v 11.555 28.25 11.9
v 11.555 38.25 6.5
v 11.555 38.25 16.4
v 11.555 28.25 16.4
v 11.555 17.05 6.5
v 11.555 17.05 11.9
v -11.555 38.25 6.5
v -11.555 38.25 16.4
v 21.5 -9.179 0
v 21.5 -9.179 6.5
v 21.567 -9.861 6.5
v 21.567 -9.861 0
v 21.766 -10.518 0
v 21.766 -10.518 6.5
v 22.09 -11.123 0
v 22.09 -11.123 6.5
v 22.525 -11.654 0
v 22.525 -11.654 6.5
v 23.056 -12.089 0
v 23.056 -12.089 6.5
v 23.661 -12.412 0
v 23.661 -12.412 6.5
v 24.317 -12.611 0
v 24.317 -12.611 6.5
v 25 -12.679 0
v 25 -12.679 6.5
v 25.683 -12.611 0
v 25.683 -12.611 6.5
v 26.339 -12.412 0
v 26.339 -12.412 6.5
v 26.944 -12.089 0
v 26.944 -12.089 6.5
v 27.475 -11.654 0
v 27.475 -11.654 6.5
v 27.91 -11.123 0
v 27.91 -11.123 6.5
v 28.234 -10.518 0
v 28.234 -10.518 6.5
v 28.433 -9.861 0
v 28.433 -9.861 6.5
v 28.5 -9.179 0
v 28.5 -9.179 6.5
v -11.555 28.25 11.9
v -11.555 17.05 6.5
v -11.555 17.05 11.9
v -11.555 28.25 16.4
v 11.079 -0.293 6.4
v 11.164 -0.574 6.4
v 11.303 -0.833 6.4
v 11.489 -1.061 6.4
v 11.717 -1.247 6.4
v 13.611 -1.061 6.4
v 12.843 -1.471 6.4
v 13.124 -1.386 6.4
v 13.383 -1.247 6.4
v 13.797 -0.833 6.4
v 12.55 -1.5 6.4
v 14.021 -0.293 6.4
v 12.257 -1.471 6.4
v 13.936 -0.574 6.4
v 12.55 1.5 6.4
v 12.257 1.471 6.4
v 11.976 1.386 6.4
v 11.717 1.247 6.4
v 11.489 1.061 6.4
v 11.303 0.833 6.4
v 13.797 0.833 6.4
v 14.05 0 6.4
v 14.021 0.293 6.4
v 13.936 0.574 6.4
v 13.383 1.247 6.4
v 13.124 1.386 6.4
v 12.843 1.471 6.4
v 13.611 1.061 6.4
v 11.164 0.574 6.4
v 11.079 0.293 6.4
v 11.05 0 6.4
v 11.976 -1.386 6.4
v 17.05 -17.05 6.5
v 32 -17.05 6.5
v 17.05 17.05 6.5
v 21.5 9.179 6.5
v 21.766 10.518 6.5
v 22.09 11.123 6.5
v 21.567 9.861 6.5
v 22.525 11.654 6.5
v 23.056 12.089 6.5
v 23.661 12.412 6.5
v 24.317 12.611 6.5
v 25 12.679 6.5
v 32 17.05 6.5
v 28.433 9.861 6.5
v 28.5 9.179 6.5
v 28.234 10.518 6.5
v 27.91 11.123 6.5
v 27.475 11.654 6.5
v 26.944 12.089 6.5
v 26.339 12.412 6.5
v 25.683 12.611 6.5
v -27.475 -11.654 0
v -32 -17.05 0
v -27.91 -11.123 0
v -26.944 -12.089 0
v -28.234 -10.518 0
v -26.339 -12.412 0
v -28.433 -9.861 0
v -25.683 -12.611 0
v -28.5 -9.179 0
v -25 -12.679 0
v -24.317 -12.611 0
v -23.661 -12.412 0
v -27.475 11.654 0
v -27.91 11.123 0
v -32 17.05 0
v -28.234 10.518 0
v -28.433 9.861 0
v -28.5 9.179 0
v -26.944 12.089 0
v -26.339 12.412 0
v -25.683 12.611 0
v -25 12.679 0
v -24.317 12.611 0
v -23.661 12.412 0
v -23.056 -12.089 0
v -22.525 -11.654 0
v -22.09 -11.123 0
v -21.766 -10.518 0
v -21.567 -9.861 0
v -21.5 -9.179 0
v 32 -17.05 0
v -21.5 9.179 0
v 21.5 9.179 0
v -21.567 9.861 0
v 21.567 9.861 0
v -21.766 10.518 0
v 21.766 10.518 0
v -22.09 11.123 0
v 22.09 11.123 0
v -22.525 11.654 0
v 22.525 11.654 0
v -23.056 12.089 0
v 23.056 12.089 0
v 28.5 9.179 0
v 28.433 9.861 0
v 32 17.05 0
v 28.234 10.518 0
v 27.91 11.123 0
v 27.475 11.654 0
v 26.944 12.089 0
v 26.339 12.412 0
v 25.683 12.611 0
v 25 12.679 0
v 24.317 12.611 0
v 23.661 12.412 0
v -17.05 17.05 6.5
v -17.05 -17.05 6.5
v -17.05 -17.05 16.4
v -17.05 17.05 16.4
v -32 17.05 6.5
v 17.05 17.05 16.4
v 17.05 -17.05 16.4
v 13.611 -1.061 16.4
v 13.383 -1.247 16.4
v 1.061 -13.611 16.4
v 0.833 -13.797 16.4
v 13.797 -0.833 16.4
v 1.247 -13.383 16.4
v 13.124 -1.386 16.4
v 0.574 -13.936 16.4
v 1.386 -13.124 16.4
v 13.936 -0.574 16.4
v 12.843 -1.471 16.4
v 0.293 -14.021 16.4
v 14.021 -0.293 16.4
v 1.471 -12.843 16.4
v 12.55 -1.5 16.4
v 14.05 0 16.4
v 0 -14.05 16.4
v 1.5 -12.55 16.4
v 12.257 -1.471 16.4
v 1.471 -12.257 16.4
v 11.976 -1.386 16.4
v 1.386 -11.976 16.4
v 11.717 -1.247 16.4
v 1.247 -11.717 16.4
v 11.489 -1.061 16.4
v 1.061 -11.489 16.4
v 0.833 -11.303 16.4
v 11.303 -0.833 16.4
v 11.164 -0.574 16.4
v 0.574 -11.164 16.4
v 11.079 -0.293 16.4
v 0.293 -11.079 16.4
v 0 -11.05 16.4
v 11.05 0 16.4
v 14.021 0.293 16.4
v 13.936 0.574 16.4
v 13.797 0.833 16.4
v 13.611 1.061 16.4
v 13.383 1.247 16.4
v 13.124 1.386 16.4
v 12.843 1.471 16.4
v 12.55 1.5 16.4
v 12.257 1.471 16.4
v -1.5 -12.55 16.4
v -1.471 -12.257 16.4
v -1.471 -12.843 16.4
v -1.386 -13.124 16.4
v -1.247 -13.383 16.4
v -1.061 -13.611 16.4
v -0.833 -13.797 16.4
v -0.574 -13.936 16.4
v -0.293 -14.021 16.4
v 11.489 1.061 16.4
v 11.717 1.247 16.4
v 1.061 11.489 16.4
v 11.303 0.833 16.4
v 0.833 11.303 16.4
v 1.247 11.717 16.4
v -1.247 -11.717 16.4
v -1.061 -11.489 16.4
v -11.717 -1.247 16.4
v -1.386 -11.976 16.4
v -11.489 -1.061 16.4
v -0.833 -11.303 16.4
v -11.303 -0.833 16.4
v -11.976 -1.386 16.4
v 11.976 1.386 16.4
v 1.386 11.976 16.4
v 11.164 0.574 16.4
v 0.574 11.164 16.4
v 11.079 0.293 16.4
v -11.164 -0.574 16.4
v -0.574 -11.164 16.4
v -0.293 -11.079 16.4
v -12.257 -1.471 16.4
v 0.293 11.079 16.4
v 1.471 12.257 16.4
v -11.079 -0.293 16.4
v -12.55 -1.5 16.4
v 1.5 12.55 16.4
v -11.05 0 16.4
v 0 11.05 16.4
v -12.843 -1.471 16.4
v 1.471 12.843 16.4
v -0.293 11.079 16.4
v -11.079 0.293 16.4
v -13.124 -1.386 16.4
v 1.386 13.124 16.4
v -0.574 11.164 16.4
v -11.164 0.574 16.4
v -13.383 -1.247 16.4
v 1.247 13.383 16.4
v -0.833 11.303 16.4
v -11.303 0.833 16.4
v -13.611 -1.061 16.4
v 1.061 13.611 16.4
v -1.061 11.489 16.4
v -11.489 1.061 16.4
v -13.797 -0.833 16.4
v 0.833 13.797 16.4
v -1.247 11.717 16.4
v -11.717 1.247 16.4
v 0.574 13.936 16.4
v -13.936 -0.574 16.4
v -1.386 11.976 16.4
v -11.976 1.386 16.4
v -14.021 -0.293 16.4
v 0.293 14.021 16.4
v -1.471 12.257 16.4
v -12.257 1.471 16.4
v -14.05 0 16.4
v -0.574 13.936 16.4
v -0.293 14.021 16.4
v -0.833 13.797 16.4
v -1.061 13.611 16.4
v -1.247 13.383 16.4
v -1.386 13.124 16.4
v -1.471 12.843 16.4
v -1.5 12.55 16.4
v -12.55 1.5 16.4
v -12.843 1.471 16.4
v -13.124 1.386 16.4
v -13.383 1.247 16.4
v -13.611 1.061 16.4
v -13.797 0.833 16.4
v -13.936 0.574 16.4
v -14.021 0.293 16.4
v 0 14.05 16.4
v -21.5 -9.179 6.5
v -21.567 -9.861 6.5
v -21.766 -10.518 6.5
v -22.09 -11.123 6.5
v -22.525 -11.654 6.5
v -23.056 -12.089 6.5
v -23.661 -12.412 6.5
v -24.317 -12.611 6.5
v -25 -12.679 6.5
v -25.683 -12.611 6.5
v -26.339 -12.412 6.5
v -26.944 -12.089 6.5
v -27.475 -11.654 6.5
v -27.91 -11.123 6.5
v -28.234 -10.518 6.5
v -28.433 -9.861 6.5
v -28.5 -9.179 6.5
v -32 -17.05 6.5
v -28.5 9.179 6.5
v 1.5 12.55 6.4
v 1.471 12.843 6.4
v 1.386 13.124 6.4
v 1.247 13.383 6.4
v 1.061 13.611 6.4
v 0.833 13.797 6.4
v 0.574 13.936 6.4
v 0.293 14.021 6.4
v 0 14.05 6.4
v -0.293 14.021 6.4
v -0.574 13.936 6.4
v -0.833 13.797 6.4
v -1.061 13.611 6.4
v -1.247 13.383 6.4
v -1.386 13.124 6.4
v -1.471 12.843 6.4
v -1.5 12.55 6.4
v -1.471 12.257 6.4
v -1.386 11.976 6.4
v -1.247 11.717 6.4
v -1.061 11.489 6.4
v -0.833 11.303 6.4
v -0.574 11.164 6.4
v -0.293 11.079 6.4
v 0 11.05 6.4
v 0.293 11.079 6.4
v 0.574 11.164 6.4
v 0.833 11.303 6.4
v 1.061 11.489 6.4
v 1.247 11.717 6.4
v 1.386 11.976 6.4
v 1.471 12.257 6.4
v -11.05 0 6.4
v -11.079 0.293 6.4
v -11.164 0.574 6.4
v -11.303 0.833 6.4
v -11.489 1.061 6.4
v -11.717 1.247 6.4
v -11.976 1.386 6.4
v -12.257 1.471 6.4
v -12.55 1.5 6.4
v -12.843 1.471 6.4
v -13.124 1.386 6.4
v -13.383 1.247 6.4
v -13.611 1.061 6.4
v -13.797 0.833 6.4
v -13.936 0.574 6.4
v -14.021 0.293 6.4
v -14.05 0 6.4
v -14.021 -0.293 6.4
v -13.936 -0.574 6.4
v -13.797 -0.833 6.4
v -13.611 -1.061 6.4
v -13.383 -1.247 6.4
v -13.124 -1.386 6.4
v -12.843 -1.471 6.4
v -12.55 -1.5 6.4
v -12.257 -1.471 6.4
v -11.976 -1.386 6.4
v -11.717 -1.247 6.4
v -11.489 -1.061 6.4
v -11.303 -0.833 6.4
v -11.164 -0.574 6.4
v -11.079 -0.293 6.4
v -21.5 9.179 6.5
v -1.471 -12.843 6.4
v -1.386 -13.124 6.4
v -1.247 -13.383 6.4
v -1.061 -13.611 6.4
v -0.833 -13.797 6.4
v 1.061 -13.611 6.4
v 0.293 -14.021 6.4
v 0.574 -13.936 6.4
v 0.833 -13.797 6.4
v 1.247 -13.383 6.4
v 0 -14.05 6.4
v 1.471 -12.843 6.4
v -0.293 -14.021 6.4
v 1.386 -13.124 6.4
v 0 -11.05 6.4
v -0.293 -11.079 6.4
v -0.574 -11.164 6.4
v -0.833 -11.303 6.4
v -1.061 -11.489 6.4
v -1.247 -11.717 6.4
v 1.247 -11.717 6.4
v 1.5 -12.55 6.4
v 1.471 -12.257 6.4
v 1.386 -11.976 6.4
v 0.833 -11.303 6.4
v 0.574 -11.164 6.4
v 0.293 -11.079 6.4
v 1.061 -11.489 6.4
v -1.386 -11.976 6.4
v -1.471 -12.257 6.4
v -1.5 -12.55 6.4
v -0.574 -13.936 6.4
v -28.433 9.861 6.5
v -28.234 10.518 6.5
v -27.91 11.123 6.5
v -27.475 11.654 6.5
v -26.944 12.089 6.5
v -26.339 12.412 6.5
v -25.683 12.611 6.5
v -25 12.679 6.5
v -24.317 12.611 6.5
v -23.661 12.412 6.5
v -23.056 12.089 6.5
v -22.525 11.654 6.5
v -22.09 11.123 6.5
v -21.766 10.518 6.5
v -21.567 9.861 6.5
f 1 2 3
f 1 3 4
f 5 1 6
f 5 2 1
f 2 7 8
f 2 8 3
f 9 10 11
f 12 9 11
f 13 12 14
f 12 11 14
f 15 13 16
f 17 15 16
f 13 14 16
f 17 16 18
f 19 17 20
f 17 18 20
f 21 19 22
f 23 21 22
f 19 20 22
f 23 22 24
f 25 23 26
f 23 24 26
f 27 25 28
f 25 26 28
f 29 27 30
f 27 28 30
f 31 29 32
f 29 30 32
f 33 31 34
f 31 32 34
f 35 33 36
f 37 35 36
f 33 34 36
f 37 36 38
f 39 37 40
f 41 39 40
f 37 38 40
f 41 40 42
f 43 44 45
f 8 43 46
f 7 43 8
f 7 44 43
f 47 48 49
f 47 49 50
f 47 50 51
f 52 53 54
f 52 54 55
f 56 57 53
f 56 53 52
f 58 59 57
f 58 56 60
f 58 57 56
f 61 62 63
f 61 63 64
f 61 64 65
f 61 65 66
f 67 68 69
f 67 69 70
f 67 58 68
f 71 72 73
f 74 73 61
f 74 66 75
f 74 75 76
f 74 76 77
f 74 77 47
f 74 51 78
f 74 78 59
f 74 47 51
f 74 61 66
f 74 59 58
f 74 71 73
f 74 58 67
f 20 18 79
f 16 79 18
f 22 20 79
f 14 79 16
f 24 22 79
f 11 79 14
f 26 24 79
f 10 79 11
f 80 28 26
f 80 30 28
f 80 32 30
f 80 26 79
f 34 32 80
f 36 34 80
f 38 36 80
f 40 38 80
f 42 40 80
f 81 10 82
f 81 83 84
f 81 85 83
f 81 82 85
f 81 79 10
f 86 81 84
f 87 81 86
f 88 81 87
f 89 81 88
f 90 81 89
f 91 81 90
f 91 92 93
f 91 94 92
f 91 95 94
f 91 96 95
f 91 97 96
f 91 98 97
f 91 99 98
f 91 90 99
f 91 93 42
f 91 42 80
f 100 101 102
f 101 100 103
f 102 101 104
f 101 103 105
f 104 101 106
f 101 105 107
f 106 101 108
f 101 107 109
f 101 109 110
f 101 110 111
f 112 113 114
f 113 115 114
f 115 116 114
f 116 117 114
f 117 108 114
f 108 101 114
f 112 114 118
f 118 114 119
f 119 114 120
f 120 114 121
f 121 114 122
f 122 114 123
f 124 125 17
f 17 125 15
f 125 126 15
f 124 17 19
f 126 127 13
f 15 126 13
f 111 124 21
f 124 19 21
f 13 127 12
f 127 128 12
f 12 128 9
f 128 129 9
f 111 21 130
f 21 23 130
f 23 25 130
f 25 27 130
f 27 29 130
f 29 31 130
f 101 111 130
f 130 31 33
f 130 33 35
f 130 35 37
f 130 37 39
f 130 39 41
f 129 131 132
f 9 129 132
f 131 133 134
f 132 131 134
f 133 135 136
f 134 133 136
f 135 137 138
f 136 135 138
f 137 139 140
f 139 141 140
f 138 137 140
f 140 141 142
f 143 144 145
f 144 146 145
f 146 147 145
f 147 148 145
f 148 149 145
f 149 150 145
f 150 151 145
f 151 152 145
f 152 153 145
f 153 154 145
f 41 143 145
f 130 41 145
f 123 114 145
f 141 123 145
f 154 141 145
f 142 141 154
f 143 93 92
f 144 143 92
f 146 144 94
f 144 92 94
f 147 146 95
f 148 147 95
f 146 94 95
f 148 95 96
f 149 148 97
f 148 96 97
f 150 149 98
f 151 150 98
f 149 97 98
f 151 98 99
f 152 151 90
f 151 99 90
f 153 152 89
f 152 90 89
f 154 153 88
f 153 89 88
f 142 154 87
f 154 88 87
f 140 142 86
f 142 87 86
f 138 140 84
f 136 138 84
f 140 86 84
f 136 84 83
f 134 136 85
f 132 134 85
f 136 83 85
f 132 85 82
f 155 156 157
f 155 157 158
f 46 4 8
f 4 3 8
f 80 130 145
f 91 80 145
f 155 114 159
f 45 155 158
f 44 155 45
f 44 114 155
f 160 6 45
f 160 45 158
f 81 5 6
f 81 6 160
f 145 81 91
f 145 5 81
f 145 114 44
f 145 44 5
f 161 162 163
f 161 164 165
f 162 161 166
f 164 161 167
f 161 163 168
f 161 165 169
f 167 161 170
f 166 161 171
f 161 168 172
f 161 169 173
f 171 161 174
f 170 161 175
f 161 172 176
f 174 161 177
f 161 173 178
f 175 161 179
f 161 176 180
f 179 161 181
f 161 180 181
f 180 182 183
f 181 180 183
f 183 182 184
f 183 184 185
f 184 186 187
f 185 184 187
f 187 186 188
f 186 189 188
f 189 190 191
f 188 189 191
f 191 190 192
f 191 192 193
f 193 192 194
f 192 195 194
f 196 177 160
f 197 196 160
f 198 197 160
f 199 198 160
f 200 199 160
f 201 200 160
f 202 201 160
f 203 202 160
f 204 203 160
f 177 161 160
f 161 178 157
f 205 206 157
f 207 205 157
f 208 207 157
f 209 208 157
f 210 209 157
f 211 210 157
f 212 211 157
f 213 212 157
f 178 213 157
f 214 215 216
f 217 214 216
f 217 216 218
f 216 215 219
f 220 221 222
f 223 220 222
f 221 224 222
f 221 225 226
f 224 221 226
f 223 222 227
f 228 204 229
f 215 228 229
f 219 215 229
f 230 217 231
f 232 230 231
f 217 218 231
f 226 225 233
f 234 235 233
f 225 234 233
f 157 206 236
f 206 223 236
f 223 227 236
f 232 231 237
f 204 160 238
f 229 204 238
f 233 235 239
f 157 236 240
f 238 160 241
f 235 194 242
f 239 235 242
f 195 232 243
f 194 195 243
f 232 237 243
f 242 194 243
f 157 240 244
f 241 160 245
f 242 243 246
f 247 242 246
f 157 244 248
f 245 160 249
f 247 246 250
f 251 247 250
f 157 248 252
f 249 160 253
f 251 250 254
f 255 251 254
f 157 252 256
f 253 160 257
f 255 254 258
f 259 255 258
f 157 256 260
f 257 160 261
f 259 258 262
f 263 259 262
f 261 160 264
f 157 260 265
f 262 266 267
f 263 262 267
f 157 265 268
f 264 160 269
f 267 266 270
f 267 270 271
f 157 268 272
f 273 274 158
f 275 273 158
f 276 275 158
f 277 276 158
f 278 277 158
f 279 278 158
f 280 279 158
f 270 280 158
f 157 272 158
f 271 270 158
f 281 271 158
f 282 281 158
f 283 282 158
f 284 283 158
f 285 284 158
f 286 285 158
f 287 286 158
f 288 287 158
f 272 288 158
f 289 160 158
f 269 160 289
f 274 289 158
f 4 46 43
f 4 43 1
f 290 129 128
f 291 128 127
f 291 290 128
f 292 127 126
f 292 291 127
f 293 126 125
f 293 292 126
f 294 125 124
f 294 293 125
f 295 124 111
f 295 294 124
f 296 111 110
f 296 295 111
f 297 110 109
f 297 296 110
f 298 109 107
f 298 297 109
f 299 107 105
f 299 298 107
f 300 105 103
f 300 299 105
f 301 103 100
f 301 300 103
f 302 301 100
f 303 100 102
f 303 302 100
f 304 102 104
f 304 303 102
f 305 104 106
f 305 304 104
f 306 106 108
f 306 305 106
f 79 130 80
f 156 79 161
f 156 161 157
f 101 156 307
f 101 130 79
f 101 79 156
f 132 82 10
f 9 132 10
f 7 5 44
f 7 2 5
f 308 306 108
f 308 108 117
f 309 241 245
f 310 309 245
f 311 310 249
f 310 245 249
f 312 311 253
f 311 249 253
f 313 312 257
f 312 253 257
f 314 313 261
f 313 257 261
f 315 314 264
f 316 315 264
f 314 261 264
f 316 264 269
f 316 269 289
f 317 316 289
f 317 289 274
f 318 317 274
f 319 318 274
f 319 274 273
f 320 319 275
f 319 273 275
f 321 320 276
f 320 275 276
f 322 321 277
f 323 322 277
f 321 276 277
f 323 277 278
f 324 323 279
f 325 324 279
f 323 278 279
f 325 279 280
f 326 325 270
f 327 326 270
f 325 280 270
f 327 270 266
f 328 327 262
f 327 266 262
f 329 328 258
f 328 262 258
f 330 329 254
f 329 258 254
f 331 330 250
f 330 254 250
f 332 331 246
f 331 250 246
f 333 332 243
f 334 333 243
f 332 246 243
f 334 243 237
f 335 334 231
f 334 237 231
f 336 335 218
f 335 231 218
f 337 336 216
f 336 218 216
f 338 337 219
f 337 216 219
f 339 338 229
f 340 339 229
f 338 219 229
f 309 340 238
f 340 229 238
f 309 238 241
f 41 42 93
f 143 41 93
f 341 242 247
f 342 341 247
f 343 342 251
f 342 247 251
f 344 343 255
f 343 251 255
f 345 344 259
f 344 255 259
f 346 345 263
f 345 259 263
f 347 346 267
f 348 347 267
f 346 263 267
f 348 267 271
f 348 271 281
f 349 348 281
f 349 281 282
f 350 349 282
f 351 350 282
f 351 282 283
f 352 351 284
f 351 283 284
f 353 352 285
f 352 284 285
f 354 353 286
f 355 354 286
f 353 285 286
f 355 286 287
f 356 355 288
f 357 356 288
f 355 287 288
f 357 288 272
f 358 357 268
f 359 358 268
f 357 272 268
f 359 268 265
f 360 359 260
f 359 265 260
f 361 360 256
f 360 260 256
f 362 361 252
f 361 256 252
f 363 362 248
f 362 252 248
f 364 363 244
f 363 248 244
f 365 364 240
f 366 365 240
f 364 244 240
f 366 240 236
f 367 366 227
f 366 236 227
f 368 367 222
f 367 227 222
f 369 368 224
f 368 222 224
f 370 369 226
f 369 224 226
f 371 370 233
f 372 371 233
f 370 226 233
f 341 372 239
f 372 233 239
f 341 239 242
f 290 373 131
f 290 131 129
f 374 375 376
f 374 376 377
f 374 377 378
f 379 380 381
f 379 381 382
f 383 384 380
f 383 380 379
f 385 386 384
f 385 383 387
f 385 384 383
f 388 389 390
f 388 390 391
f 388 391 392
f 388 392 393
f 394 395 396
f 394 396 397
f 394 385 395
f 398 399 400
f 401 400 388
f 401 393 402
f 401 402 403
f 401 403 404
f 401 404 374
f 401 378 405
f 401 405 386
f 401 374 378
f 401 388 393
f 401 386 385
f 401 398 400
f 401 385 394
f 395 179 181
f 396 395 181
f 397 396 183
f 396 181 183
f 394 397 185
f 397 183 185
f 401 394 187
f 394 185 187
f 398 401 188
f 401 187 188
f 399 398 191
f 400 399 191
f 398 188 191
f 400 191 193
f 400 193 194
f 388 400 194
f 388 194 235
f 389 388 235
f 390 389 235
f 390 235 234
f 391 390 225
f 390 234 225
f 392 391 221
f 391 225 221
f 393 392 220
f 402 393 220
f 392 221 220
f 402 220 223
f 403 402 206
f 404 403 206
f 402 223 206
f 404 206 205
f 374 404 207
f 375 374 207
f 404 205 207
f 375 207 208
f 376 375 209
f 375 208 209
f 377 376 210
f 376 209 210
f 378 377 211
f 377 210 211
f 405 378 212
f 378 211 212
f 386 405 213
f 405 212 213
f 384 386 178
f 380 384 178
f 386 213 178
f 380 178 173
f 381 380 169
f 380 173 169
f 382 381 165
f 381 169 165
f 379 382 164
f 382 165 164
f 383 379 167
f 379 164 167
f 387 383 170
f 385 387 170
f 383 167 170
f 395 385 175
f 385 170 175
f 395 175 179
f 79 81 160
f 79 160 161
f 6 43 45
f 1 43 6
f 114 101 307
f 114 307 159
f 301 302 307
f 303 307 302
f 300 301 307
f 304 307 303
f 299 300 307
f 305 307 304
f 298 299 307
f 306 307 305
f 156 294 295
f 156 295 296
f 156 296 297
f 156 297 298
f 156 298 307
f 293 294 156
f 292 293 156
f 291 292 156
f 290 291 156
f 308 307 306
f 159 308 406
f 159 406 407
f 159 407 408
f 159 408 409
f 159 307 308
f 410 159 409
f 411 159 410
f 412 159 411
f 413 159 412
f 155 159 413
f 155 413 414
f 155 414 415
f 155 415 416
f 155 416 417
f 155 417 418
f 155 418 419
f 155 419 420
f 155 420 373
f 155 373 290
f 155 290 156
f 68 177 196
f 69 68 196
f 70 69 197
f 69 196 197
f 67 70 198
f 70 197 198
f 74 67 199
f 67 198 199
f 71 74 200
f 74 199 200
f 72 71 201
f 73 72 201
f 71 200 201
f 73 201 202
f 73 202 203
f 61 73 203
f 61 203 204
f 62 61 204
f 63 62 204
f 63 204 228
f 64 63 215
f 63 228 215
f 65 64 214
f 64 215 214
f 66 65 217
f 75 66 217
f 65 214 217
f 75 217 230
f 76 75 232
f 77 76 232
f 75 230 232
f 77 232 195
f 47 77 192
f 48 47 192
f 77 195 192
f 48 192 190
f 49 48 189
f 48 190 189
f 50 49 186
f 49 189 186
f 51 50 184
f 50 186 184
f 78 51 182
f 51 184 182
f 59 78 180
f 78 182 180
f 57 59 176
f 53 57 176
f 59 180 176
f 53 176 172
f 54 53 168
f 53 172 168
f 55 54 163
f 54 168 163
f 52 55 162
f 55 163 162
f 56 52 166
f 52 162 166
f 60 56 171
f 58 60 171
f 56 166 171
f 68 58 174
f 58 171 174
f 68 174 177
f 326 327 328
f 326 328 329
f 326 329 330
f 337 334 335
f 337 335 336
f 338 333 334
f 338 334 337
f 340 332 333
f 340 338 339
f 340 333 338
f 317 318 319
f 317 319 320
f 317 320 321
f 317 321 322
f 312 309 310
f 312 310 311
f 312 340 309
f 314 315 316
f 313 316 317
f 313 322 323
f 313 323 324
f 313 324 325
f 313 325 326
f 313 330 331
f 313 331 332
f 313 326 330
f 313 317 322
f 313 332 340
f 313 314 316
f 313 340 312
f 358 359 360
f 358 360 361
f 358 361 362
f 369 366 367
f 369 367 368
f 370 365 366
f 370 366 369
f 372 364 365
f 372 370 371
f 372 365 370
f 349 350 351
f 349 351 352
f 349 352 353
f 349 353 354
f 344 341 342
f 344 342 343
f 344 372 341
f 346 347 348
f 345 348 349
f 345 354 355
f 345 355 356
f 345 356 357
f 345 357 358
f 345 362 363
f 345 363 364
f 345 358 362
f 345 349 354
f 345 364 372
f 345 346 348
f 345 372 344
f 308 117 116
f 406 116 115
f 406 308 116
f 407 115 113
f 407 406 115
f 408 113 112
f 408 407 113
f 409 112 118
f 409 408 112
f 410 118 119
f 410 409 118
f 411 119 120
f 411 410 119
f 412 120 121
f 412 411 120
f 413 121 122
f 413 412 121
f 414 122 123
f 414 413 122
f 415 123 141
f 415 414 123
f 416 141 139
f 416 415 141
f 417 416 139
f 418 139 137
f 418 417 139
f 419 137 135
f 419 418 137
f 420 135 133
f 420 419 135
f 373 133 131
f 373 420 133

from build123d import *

# Parameters (mm, degrees)
SKETCH1_W           = 64
SKETCH1_H           = 34.1
BOSS_EXTRUDE1_DEPTH = 6.5
BOSS_EXTRUDE2_DEPTH = 9.9
SKETCH4_W           = 23.11
SKETCH4_H           = 11.2
CUT_EXTRUDE1_DEPTH  = 4.5
CUT_EXTRUDE2_DEPTH  = 7.5
SKETCH7_R           = 1.5
CUT_EXTRUDE3_DEPTH  = 10


with BuildPart() as part:
    # Sketch1 → Boss-Extrude1 (new body)
    with BuildSketch(Plane.XY):
        Rectangle(SKETCH1_W, SKETCH1_H)
    extrude(amount=BOSS_EXTRUDE1_DEPTH)

    # Sketch2 → Boss-Extrude2 (add)
    with BuildSketch(Plane.XY.offset(6.5)):
        Polygon((-17.05, 17.05), (-11.555, 17.05), (-11.555, 38.25), (11.555, 38.25), (11.555, 17.05), (17.05, 17.05), (17.05, -17.05), (-17.05, -17.05), align=None)
    extrude(amount=BOSS_EXTRUDE2_DEPTH)

    # Sketch4 → Cut-Extrude1 (cut)
    with BuildSketch(Plane.XY.offset(16.4)):
        with Locations((0, 22.65)):
            Rectangle(SKETCH4_W, SKETCH4_H)
    extrude(amount=-CUT_EXTRUDE1_DEPTH, mode=Mode.SUBTRACT)

    # Sketch6 → Cut-Extrude2 (cut, through all)
    with BuildSketch(Plane.XY.offset(6.5)):
        with BuildLine():
            Line((-21.5, 9.178681579), (-21.5, -9.178681579))
            ThreePointArc((-21.5, -9.178681579), (-25, -12.678681579), (-28.5, -9.178681579))
            Line((-28.5, -9.178681579), (-28.5, 9.178681579))
            ThreePointArc((-28.5, 9.178681579), (-25, 12.678681579), (-21.5, 9.178681579))
        make_face()
    cut_extrude2 = extrude(amount=-CUT_EXTRUDE2_DEPTH, mode=Mode.SUBTRACT)

    # Mirror1: Cut-Extrude2 across plane
    add(cut_extrude2.mirror(Plane(origin=(0, 0, 0), x_dir=(0, 0, 1), z_dir=(1, 0, 0))), mode=Mode.SUBTRACT)

    # Sketch7 → Cut-Extrude3 (cut)
    with BuildSketch(Plane.XY.offset(16.4)):
        with Locations((-12.55, 0)):
            Circle(SKETCH7_R)
        with Locations((12.55, 0)):
            Circle(SKETCH7_R)
        with Locations((0, 12.55)):
            Circle(SKETCH7_R)
        with Locations((0, -12.55)):
            Circle(SKETCH7_R)
    extrude(amount=-CUT_EXTRUDE3_DEPTH, mode=Mode.SUBTRACT)


solid = part.part
